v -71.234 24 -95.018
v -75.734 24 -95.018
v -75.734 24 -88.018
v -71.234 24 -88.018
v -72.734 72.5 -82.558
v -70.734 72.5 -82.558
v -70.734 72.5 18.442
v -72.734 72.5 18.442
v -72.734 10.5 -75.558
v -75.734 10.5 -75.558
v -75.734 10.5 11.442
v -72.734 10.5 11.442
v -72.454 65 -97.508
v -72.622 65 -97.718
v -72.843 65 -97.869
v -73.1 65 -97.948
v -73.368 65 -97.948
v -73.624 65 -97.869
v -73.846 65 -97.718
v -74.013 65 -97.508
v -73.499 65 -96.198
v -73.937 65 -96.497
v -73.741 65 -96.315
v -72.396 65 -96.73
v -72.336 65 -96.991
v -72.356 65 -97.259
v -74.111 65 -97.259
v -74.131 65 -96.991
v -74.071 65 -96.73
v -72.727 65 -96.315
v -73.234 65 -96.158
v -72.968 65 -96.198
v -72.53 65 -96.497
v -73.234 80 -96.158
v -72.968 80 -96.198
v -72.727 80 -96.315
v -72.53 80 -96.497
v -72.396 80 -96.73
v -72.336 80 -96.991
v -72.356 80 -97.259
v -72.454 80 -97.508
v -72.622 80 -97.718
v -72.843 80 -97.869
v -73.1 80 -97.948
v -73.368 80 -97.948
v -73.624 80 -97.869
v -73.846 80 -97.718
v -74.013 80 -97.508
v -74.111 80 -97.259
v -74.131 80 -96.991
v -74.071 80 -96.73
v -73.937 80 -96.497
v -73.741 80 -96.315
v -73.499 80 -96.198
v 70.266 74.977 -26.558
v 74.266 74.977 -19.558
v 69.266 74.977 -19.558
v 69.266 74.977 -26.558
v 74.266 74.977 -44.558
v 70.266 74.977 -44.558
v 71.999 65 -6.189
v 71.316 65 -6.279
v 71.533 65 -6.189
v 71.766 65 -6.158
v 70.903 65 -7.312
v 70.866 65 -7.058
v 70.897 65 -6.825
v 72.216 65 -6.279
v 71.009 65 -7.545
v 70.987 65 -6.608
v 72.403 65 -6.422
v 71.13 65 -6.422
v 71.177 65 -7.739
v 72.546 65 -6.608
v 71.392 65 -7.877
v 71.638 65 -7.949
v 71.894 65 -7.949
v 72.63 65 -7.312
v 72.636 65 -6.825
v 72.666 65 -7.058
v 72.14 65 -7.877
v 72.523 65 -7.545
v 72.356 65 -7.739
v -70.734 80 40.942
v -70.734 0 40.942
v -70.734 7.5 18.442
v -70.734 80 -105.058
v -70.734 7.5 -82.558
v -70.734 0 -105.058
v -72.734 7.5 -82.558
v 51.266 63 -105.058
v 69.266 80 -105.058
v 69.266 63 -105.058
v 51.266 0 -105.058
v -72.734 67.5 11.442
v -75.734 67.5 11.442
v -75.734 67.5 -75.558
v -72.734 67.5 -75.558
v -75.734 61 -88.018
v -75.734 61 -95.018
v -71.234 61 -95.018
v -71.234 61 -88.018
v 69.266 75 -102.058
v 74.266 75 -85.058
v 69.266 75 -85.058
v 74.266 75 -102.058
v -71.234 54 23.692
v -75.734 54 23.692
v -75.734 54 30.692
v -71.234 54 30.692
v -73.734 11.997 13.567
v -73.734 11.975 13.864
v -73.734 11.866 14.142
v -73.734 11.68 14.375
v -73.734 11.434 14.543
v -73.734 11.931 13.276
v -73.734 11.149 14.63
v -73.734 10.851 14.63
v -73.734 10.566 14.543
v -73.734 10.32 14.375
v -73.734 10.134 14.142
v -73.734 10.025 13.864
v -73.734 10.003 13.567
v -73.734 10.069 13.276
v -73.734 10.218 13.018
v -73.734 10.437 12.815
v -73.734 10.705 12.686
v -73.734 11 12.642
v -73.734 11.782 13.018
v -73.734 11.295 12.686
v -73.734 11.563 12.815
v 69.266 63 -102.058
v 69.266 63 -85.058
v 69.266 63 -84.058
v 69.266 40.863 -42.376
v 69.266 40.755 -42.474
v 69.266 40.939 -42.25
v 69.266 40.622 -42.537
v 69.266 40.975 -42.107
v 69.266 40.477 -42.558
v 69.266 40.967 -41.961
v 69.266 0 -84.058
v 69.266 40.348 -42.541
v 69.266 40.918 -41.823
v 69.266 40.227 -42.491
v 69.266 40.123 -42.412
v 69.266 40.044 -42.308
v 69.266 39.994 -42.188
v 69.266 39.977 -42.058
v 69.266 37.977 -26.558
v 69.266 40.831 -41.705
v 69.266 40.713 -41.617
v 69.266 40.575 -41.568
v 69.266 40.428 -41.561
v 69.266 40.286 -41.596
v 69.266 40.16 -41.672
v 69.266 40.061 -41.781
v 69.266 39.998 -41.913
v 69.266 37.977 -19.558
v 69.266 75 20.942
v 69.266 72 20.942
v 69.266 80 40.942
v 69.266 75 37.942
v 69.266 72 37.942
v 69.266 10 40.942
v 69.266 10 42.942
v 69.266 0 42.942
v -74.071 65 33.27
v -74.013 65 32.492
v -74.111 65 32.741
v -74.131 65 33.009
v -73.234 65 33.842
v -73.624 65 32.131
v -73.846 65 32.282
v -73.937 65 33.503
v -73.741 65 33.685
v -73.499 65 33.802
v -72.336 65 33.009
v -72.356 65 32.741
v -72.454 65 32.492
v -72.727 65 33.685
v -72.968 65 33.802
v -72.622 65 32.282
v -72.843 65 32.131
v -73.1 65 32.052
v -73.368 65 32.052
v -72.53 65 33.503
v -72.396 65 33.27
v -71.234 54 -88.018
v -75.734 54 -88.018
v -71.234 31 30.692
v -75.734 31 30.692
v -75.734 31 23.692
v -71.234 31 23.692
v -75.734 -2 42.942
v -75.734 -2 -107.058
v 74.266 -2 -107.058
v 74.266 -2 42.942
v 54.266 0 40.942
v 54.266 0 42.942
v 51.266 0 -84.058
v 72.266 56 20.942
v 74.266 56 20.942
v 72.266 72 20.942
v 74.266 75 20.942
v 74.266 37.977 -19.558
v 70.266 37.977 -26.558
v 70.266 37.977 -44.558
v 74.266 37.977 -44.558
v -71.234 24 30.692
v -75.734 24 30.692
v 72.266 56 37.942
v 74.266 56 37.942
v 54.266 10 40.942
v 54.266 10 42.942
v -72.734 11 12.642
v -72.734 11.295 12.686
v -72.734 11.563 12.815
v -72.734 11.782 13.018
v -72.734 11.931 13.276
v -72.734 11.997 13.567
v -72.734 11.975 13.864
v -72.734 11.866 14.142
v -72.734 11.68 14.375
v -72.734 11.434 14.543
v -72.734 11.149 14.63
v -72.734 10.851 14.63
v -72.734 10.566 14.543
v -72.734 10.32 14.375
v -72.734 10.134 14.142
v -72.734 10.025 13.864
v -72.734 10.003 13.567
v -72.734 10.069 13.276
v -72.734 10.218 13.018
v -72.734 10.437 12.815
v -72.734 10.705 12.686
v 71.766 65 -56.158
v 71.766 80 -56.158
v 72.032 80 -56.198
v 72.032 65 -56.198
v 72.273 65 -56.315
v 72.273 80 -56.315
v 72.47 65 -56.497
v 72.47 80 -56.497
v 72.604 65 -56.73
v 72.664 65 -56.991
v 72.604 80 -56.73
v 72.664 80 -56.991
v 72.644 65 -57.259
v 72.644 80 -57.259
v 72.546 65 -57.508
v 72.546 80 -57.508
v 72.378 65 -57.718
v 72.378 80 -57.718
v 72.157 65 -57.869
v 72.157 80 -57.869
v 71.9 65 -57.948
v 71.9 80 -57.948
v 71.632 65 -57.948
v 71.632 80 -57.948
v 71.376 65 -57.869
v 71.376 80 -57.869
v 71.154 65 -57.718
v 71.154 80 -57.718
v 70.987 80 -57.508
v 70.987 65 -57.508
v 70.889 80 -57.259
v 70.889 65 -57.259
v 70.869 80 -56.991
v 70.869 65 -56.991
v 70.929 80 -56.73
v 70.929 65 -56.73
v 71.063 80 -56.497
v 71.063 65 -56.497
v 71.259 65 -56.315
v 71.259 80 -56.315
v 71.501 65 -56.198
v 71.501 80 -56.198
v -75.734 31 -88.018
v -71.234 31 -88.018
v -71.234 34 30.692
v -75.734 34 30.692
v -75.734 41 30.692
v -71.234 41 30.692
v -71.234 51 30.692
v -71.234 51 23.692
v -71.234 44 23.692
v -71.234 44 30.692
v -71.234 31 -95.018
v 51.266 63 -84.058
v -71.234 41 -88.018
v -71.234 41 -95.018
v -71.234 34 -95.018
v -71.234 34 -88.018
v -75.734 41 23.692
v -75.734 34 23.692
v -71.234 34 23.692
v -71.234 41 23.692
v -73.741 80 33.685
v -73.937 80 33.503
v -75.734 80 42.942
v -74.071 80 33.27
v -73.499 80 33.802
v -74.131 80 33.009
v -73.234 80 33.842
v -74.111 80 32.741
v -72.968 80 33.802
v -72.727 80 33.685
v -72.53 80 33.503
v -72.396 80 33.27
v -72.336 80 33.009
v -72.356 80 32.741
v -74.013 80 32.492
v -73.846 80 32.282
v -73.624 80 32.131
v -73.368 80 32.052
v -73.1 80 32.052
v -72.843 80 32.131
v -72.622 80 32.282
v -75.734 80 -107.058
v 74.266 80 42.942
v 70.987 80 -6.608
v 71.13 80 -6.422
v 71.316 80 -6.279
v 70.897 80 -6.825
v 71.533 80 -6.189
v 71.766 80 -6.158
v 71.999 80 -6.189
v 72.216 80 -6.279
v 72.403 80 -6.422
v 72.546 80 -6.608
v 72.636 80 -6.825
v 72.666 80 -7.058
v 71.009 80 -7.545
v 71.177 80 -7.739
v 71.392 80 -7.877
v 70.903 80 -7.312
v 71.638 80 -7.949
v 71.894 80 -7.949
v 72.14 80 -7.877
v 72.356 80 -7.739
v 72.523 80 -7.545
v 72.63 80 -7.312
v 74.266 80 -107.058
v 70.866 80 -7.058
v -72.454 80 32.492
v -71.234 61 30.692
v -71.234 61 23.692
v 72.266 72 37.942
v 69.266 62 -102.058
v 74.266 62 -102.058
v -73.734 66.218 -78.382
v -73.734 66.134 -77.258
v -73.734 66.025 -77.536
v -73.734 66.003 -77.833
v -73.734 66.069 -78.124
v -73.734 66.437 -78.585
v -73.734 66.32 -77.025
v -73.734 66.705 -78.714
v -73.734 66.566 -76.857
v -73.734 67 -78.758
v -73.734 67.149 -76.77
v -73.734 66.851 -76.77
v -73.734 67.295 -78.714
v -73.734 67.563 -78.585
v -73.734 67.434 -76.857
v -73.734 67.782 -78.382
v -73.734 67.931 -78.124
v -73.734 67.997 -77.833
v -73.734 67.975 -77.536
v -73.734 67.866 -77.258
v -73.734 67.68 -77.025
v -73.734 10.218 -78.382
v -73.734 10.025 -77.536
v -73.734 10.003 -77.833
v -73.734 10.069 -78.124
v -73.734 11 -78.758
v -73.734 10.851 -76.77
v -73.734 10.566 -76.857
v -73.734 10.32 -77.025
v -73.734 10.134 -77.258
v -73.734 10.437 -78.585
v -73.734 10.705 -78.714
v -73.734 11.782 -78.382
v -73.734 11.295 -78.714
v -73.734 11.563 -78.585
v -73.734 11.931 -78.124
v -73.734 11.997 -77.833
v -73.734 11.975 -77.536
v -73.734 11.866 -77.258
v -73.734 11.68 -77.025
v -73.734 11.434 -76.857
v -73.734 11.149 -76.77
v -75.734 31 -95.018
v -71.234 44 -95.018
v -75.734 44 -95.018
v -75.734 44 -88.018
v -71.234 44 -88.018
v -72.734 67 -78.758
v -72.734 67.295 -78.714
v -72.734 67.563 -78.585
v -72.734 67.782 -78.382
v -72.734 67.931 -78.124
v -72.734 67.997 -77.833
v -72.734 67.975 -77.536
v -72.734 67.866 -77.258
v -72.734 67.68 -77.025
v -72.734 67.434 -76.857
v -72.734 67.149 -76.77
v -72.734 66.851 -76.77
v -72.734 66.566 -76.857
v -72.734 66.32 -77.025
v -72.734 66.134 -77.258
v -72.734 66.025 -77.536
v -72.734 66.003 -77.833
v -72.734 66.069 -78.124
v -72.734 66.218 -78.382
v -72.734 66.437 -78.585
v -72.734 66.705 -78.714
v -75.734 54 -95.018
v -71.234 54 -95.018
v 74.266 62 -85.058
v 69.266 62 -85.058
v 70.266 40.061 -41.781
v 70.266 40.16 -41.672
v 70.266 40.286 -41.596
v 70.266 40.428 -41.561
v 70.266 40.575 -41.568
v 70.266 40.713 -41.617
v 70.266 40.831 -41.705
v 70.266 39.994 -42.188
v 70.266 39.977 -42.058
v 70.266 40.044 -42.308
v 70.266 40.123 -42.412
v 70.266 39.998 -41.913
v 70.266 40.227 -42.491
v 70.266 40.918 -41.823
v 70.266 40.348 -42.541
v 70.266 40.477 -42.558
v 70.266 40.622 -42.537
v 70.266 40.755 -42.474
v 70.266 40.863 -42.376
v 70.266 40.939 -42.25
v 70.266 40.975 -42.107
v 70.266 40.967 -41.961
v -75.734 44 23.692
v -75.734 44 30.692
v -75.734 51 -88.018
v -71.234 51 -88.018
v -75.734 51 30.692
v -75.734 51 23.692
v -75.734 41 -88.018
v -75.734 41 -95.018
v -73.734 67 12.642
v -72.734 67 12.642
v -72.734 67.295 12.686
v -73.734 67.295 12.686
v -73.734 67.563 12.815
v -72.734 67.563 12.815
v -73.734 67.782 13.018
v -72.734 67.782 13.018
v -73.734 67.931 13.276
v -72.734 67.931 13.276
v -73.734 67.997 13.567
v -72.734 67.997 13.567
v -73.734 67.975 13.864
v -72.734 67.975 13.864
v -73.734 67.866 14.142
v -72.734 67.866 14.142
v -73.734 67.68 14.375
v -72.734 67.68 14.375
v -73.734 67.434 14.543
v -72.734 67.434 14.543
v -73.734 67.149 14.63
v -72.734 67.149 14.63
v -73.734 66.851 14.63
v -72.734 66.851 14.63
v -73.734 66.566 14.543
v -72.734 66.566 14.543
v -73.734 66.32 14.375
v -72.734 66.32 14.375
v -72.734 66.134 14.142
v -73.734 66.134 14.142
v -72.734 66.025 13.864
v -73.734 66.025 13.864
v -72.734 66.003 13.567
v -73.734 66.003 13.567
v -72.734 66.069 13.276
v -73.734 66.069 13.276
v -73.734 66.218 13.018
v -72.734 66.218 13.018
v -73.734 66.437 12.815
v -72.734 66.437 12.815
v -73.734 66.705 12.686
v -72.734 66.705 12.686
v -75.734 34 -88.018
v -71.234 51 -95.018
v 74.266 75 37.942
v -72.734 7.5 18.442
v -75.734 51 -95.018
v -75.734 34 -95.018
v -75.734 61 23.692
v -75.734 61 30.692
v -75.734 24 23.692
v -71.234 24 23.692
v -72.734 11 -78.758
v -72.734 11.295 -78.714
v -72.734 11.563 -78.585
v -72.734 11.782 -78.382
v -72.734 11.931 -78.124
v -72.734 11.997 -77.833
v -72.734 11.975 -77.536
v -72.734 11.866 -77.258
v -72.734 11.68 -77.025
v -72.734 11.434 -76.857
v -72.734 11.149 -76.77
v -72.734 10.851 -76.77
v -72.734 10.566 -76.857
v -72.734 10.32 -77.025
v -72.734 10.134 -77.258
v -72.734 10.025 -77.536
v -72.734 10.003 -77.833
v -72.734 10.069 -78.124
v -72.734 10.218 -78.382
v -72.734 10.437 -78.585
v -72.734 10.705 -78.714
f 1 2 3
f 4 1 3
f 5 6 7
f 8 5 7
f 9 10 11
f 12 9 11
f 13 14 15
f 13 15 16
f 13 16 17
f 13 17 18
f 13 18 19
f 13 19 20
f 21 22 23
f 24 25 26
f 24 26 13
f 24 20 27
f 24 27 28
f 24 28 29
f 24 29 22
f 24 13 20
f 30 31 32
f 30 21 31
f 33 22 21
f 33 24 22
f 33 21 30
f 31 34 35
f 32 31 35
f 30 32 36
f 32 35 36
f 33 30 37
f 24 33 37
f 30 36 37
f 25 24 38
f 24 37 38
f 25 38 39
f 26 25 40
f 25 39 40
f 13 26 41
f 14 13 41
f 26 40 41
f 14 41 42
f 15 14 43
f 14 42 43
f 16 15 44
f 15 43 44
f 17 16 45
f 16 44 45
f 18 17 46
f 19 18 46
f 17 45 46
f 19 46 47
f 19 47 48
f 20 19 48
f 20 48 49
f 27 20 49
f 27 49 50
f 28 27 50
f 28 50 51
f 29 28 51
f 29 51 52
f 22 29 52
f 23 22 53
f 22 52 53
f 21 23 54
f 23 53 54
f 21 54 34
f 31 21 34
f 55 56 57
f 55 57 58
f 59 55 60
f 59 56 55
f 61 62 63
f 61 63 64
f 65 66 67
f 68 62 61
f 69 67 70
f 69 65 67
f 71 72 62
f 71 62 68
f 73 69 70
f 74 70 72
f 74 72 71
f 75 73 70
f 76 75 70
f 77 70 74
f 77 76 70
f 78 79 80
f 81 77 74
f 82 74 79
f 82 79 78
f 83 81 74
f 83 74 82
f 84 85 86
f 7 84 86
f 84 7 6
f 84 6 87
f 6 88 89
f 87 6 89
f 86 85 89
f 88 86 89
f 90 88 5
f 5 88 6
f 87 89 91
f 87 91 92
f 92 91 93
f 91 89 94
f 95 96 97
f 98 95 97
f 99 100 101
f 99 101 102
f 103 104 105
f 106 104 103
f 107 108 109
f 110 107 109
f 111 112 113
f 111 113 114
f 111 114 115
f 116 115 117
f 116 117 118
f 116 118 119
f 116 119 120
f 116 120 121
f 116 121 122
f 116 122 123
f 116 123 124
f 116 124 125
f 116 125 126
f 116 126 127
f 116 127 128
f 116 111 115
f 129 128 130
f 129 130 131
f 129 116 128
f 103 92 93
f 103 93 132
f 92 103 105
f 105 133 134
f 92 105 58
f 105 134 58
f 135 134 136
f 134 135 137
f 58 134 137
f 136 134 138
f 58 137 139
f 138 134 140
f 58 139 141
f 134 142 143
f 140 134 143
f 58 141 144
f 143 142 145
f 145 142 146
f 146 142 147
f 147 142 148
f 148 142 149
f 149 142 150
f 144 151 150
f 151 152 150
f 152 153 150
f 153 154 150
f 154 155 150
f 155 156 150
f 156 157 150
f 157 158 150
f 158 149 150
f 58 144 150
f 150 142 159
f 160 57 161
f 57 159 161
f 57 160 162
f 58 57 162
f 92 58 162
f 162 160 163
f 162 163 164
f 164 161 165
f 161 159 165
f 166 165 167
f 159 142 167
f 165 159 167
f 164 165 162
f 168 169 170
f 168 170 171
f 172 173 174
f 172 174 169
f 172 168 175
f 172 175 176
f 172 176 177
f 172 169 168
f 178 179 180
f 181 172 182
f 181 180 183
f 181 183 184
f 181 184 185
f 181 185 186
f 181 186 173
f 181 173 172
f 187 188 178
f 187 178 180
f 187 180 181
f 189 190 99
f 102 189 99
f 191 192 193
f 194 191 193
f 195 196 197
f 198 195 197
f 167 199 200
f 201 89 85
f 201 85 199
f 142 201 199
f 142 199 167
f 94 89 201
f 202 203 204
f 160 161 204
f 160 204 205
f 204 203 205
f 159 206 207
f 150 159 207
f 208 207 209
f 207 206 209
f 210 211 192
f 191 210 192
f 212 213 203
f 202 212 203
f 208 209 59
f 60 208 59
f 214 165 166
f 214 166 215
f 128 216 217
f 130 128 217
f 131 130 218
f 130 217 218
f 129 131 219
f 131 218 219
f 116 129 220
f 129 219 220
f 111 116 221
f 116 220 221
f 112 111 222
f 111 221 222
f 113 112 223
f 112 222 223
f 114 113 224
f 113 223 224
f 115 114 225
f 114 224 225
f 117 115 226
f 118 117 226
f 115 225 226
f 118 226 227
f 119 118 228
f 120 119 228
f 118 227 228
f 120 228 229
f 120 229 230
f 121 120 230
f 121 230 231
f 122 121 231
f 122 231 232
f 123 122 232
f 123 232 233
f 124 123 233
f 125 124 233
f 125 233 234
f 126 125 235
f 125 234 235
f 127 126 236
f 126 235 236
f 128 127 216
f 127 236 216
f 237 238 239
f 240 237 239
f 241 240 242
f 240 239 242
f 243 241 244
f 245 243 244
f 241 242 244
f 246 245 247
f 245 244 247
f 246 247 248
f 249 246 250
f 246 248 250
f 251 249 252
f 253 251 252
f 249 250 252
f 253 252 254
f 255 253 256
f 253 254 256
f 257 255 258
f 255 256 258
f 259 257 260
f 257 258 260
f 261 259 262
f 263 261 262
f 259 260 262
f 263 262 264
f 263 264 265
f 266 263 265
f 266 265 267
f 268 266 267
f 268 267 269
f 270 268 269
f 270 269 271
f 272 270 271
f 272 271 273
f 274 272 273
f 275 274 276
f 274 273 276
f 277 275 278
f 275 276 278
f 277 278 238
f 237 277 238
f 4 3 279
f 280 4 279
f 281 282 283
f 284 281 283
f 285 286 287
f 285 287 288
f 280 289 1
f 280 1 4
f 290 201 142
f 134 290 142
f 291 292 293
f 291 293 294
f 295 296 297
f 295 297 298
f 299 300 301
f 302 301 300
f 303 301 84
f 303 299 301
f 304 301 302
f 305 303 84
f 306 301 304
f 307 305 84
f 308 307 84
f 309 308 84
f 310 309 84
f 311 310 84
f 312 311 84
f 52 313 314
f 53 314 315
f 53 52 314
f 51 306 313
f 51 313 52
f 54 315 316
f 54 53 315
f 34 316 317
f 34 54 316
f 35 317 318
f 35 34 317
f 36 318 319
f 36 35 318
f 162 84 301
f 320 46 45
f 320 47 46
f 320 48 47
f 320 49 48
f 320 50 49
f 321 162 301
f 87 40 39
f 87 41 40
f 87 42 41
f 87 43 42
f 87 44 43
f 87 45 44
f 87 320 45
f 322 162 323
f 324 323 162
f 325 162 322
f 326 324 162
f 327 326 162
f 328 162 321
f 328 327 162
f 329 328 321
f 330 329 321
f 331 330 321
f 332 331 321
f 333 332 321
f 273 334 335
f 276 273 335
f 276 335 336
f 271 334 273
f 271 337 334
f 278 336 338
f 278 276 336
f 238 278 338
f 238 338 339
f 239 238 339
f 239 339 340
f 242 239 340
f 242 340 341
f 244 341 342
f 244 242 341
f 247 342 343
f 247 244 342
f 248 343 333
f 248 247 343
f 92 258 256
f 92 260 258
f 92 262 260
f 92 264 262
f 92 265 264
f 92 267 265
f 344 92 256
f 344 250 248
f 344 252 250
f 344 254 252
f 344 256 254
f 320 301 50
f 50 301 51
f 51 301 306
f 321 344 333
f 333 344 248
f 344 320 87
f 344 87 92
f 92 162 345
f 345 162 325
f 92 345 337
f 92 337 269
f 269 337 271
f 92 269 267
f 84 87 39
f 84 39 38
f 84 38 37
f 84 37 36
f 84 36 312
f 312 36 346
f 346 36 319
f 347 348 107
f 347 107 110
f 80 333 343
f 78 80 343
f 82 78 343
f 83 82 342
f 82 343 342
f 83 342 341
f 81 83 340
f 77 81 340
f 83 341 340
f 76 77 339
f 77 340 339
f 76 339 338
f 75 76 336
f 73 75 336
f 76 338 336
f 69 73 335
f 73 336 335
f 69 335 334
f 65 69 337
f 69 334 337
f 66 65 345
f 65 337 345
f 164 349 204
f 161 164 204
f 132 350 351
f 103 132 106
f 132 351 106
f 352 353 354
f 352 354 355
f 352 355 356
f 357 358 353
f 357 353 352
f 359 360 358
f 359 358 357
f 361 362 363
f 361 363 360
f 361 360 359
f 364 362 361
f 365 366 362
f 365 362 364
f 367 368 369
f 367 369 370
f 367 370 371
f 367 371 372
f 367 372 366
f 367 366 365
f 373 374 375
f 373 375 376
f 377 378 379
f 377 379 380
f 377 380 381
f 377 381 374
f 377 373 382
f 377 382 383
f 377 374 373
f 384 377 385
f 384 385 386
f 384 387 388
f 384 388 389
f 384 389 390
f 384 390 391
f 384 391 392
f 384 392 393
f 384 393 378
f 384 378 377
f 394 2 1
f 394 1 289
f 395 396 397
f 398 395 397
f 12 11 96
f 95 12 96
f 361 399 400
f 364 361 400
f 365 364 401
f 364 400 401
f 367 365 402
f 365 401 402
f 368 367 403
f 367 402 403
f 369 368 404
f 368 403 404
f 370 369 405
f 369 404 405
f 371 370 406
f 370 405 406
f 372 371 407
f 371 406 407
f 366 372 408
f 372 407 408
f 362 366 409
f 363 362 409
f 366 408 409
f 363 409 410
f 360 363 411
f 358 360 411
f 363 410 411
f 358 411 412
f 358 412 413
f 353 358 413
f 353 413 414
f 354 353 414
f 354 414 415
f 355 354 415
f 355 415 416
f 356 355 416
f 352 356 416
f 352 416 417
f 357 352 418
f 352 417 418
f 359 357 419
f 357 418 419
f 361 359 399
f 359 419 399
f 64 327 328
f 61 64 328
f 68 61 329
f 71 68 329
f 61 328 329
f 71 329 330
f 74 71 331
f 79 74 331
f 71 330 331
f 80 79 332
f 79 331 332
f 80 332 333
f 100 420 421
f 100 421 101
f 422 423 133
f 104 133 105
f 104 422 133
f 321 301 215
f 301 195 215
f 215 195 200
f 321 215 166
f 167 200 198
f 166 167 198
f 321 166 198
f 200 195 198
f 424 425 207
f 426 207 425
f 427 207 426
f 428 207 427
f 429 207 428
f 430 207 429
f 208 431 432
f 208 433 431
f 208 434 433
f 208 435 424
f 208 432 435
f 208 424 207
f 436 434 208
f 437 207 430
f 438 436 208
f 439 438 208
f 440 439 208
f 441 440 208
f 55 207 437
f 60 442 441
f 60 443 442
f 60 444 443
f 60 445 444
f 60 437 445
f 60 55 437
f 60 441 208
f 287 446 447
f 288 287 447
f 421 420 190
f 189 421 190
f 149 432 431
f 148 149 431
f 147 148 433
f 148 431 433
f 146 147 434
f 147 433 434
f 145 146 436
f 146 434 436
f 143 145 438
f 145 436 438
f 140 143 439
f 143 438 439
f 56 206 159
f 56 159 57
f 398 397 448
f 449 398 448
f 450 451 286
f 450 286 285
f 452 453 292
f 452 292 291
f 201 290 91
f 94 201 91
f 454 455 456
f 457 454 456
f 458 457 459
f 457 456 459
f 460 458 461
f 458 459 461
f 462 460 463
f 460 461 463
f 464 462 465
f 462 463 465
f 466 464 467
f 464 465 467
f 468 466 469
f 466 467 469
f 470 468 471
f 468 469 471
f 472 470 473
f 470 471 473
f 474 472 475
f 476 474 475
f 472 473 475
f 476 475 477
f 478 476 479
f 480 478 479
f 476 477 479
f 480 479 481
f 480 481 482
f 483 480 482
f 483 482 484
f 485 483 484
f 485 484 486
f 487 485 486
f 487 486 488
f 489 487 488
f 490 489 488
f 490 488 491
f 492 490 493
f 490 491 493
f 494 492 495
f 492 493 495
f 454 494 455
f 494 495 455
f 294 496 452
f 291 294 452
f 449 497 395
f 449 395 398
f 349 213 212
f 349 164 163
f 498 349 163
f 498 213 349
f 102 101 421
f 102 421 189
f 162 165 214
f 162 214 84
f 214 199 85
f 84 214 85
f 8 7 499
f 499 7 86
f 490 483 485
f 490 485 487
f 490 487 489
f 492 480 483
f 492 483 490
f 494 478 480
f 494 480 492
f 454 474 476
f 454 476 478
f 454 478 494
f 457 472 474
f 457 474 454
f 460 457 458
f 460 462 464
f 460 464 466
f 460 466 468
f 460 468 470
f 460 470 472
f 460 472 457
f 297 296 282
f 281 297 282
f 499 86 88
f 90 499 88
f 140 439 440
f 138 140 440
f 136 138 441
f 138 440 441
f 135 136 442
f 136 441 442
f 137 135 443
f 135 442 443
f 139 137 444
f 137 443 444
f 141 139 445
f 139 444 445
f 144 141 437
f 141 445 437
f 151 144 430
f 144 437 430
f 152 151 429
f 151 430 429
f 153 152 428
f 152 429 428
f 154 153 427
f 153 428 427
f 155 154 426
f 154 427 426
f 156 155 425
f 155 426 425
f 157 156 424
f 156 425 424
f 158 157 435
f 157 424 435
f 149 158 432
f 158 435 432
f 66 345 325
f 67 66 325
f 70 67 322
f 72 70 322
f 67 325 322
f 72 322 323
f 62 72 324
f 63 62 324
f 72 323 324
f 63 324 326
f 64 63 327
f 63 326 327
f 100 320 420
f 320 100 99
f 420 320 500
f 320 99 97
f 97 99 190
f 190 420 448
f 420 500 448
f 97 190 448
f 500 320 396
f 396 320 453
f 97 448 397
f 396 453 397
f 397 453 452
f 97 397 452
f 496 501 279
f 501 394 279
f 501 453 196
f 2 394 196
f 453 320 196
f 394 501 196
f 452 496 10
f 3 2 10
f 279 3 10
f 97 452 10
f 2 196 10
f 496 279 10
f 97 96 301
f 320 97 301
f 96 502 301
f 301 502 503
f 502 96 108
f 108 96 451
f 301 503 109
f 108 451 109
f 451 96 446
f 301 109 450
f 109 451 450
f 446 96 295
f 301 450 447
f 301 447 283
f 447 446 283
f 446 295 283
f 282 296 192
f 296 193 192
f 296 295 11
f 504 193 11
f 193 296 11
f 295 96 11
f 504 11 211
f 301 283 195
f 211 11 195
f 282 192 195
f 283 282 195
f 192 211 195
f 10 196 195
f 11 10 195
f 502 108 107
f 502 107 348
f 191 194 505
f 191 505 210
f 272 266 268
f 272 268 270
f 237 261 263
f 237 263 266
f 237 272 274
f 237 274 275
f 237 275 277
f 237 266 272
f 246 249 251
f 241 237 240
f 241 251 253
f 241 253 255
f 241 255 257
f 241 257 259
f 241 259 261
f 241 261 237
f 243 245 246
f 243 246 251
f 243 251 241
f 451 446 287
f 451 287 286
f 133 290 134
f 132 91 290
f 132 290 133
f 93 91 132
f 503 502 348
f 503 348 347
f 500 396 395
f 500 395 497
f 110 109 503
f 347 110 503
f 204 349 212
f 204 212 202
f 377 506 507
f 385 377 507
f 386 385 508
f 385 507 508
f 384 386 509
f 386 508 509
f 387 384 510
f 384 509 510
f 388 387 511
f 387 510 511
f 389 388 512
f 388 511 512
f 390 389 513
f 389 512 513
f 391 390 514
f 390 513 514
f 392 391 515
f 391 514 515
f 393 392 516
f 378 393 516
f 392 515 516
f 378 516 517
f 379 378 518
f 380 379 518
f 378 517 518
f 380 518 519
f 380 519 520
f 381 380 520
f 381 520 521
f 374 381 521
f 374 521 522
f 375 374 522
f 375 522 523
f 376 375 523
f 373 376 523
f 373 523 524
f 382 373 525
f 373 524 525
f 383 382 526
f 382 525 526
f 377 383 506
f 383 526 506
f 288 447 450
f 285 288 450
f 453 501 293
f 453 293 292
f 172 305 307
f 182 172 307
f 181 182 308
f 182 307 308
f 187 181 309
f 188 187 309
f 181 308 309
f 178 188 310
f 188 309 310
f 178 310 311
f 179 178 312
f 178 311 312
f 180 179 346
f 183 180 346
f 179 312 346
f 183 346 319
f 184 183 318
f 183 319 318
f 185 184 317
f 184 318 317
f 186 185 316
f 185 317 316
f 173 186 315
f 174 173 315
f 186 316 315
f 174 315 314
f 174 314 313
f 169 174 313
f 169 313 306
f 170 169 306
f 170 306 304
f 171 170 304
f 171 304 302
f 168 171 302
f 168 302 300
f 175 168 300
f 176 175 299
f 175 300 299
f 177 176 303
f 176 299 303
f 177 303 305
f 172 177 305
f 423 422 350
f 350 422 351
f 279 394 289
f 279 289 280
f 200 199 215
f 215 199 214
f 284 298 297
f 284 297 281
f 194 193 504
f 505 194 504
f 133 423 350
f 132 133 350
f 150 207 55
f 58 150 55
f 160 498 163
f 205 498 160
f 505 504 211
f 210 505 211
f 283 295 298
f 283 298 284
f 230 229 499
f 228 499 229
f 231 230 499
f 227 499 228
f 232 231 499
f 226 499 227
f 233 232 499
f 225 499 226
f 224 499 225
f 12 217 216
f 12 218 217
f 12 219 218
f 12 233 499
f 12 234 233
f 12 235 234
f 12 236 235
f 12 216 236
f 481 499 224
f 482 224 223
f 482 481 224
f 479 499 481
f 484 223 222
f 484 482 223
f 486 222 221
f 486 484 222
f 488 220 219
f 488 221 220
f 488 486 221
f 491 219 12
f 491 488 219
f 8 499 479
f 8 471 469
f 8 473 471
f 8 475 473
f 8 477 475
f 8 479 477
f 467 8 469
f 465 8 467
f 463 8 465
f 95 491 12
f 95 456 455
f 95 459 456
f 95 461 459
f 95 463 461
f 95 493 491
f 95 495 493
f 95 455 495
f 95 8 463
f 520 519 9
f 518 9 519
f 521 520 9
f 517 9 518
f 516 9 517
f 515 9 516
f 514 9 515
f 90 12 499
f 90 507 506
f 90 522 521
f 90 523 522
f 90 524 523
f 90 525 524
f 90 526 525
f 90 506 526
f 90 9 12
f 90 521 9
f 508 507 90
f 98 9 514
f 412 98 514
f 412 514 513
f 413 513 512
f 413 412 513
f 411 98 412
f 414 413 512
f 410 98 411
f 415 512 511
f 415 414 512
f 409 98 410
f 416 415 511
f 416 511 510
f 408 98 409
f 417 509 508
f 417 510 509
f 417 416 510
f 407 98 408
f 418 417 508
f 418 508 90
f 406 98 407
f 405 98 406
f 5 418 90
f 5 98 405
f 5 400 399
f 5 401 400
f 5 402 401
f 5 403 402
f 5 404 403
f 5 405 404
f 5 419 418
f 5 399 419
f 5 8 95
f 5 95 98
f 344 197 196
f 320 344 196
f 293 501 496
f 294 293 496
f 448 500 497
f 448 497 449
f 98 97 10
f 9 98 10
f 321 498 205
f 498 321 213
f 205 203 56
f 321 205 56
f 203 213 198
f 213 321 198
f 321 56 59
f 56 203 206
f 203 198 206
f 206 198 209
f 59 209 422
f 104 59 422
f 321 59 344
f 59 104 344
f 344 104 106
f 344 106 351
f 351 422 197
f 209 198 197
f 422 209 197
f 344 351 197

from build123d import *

# Parameters (mm, degrees)
SKIZZE1_W                        = 150
SKIZZE1_H                        = 150
AUFSATZ_LINEAR_AUSTRAGEN1_DEPTH  = 2
SKIZZE1_3_W                      = 150
SKIZZE1_3_H                      = 150
SKIZZE1_3_W_2                    = 140
SKIZZE1_3_H_2                    = 146
AUFSATZ_LINEAR_AUSTRAGEN2_DEPTH  = 80
SKIZZE2_W                        = 87
SKIZZE2_H                        = 57
SCHNITT_LINEAR_AUSTRAGEN1_DEPTH  = 10
SKIZZE5_W                        = 17
SKIZZE5_H                        = 13
SCHNITT_LINEAR_AUSTRAGEN3_DEPTH  = 10
SKIZZE6_W                        = 17
SKIZZE6_H                        = 19
SCHNITT_LINEAR_AUSTRAGEN4_DEPTH  = 2
SKIZZE7_W                        = 17
SKIZZE7_H                        = 3
SCHNITT_LINEAR_AUSTRAGEN5_DEPTH  = 10
SKIZZE9_W                        = 18
SKIZZE9_H                        = 21
AUFSATZ_LINEAR_AUSTRAGEN3_DEPTH  = 63
SKIZZE10_W                       = 15
SKIZZE10_H                       = 10
SCHNITT_LINEAR_AUSTRAGEN6_DEPTH  = 63
SKIZZE11_W                       = 101
SKIZZE11_H                       = 65
SCHNITT_LINEAR_AUSTRAGEN7_DEPTH  = 2
SKIZZE17_R                       = 1
SCHNITT_LINEAR_AUSTRAGEN10_DEPTH = 1
SKIZZE18_W                       = 7
SKIZZE18_H                       = 7
SCHNITT_LINEAR_AUSTRAGEN11_DEPTH = 4.5
SKIZZE19_R                       = 0.9
SCHNITT_LINEAR_AUSTRAGEN12_DEPTH = 15
SKIZZE20_W                       = 25
SKIZZE20_H                       = 37
SCHNITT_LINEAR_AUSTRAGEN13_DEPTH = 4
SKIZZE21_W                       = 7
SKIZZE21_H                       = 37
SCHNITT_LINEAR_AUSTRAGEN14_DEPTH = 3
SKIZZE24_R                       = 0.5
SCHNITT_LINEAR_AUSTRAGEN15_DEPTH = 6


with BuildPart() as part:
    # Skizze1 → Aufsatz-Linear austragen1 (new body)
    with BuildSketch(Plane(origin=(0, 0, 0), x_dir=(1, 0, 0), z_dir=(0, 1, 0))):
        with Locations((-0.733702775, 32.058376742)):
            Rectangle(SKIZZE1_W, SKIZZE1_H)
    extrude(amount=-AUFSATZ_LINEAR_AUSTRAGEN1_DEPTH)

    # Skizze1<3> → Aufsatz-Linear austragen2 (add)
    with BuildSketch(Plane(origin=(0, 0, 0), x_dir=(1, 0, 0), z_dir=(0, 1, 0))):
        with Locations((-0.733702775, 32.058376742)):
            Rectangle(SKIZZE1_3_W, SKIZZE1_3_H)
        with Locations((-0.733702775, 32.058376742)):
            Rectangle(SKIZZE1_3_W_2, SKIZZE1_3_H_2, mode=Mode.SUBTRACT)
    extrude(amount=AUFSATZ_LINEAR_AUSTRAGEN2_DEPTH)

    # Skizze2 → Schnitt-Linear austragen1 (cut)
    with BuildSketch(Plane.ZY.offset(75.733702775)):
        with Locations((-32.058376742, 39)):
            Rectangle(SKIZZE2_W, SKIZZE2_H)
    extrude(amount=-SCHNITT_LINEAR_AUSTRAGEN1_DEPTH, mode=Mode.SUBTRACT)

    # Skizze5 → Schnitt-Linear austragen3 (cut)
    with BuildSketch(Plane(origin=(74.266297225, 0, 0), x_dir=(0, 0, -1), z_dir=(1, 0, 0))):
        with Locations((93.558376742, 68.5)):
            Rectangle(SKIZZE5_W, SKIZZE5_H)
    extrude(amount=-SCHNITT_LINEAR_AUSTRAGEN3_DEPTH, mode=Mode.SUBTRACT)

    # Skizze6 → Schnitt-Linear austragen4 (cut)
    with BuildSketch(Plane(origin=(74.266297225, 0, 0), x_dir=(0, 0, -1), z_dir=(1, 0, 0))):
        with Locations((-29.441623258, 65.5)):
            Rectangle(SKIZZE6_W, SKIZZE6_H)
    extrude(amount=-SCHNITT_LINEAR_AUSTRAGEN4_DEPTH, mode=Mode.SUBTRACT)

    # Skizze7 → Schnitt-Linear austragen5 (cut)
    with BuildSketch(Plane(origin=(72.266297225, 0, 0), x_dir=(0, 0, -1), z_dir=(1, 0, 0))):
        with Locations((-29.441623258, 73.5)):
            Rectangle(SKIZZE7_W, SKIZZE7_H)
    extrude(amount=-SCHNITT_LINEAR_AUSTRAGEN5_DEPTH, mode=Mode.SUBTRACT)

    # Skizze9 → Aufsatz-Linear austragen3 (add)
    with BuildSketch(Plane(origin=(0, 0, 0), x_dir=(1, 0, 0), z_dir=(0, 1, 0))):
        with Locations((60.266297225, 94.558376742)):
            Rectangle(SKIZZE9_W, SKIZZE9_H)
    extrude(amount=AUFSATZ_LINEAR_AUSTRAGEN3_DEPTH)

    # Skizze10 → Schnitt-Linear austragen6 (cut)
    with BuildSketch(Plane(origin=(0, 0, 40.941623258), x_dir=(-1, 0, 0), z_dir=(0, 0, -1))):
        with Locations((-61.766297225, 5)):
            Rectangle(SKIZZE10_W, SKIZZE10_H)
    extrude(amount=-SCHNITT_LINEAR_AUSTRAGEN6_DEPTH, mode=Mode.SUBTRACT)

    # Skizze11 → Schnitt-Linear austragen7 (cut)
    with BuildSketch(Plane(origin=(-70.733702775, 0, 0), x_dir=(0, 0, -1), z_dir=(1, 0, 0))):
        with Locations((32.058376742, 40)):
            Rectangle(SKIZZE11_W, SKIZZE11_H)
    extrude(amount=-SCHNITT_LINEAR_AUSTRAGEN7_DEPTH, mode=Mode.SUBTRACT)

    # Skizze17 → Schnitt-Linear austragen10 (cut)
    with BuildSketch(Plane(origin=(-72.733702775, 0, 0), x_dir=(0, 0, -1), z_dir=(1, 0, 0))):
        with Locations((77.758376742, 67)):
            Circle(SKIZZE17_R)
        with Locations((77.758376742, 11)):
            Circle(SKIZZE17_R)
        with Locations((-13.641623258, 11)):
            Circle(SKIZZE17_R)
        with Locations((-13.641623258, 67)):
            Circle(SKIZZE17_R)
    extrude(amount=-SCHNITT_LINEAR_AUSTRAGEN10_DEPTH, mode=Mode.SUBTRACT)

    # Skizze18 → Schnitt-Linear austragen11 (cut)
    with BuildSketch(Plane.ZY.offset(75.733702775)):
        with Locations((27.191623258, 57.5)):
            Rectangle(SKIZZE18_W, SKIZZE18_H)
        Polygon((30.691623258, 31), (27.191623258, 31), (23.691623258, 31), (23.691623258, 24), (30.691623258, 24), align=None)
        with Locations((27.191623258, 37.5)):
            Rectangle(SKIZZE18_W, SKIZZE18_H)
        with Locations((27.191623258, 47.5)):
            Rectangle(SKIZZE18_W, SKIZZE18_H)
        with Locations((-91.518407477, 57.5)):
            Rectangle(SKIZZE18_W, SKIZZE18_H)
        with Locations((-91.518407477, 47.5)):
            Rectangle(SKIZZE18_W, SKIZZE18_H)
        with Locations((-91.518407477, 37.5)):
            Rectangle(SKIZZE18_W, SKIZZE18_H)
        with Locations((-91.518407477, 27.5)):
            Rectangle(SKIZZE18_W, SKIZZE18_H)
    extrude(amount=-SCHNITT_LINEAR_AUSTRAGEN11_DEPTH, mode=Mode.SUBTRACT)

    # Skizze19 → Schnitt-Linear austragen12 (cut)
    with BuildSketch(Plane(origin=(0, 80, 0), x_dir=(1, 0, 0), z_dir=(0, 1, 0))):
        with Locations((-73.233702775, -32.941623258)):
            Circle(SKIZZE19_R)
        with Locations((-73.233702775, 97.058376742)):
            Circle(SKIZZE19_R)
        with Locations((71.766297225, 7.058376742)):
            Circle(SKIZZE19_R)
        with Locations((71.766297225, 57.058376742)):
            Circle(SKIZZE19_R)
    extrude(amount=-SCHNITT_LINEAR_AUSTRAGEN12_DEPTH, mode=Mode.SUBTRACT)

    # Skizze20 → Schnitt-Linear austragen13 (cut)
    with BuildSketch(Plane(origin=(74.266297225, 0, 0), x_dir=(0, 0, -1), z_dir=(1, 0, 0))):
        with Locations((32.058376742, 56.476963809)):
            Rectangle(SKIZZE20_W, SKIZZE20_H)
    extrude(amount=-SCHNITT_LINEAR_AUSTRAGEN13_DEPTH, mode=Mode.SUBTRACT)

    # Skizze21 → Schnitt-Linear austragen14 (cut)
    with BuildSketch(Plane(origin=(70.266297225, 0, 0), x_dir=(0, 0, -1), z_dir=(1, 0, 0))):
        with Locations((23.058376742, 56.476963809)):
            Rectangle(SKIZZE21_W, SKIZZE21_H)
    extrude(amount=-SCHNITT_LINEAR_AUSTRAGEN14_DEPTH, mode=Mode.SUBTRACT)

    # Skizze24 → Schnitt-Linear austragen15 (cut)
    with BuildSketch(Plane(origin=(70.266297225, 0, 0), x_dir=(0, 0, -1), z_dir=(1, 0, 0))):
        with Locations((42.058376742, 40.476963809)):
            Circle(SKIZZE24_R)
    extrude(amount=-SCHNITT_LINEAR_AUSTRAGEN15_DEPTH, mode=Mode.SUBTRACT)


solid = part.part
